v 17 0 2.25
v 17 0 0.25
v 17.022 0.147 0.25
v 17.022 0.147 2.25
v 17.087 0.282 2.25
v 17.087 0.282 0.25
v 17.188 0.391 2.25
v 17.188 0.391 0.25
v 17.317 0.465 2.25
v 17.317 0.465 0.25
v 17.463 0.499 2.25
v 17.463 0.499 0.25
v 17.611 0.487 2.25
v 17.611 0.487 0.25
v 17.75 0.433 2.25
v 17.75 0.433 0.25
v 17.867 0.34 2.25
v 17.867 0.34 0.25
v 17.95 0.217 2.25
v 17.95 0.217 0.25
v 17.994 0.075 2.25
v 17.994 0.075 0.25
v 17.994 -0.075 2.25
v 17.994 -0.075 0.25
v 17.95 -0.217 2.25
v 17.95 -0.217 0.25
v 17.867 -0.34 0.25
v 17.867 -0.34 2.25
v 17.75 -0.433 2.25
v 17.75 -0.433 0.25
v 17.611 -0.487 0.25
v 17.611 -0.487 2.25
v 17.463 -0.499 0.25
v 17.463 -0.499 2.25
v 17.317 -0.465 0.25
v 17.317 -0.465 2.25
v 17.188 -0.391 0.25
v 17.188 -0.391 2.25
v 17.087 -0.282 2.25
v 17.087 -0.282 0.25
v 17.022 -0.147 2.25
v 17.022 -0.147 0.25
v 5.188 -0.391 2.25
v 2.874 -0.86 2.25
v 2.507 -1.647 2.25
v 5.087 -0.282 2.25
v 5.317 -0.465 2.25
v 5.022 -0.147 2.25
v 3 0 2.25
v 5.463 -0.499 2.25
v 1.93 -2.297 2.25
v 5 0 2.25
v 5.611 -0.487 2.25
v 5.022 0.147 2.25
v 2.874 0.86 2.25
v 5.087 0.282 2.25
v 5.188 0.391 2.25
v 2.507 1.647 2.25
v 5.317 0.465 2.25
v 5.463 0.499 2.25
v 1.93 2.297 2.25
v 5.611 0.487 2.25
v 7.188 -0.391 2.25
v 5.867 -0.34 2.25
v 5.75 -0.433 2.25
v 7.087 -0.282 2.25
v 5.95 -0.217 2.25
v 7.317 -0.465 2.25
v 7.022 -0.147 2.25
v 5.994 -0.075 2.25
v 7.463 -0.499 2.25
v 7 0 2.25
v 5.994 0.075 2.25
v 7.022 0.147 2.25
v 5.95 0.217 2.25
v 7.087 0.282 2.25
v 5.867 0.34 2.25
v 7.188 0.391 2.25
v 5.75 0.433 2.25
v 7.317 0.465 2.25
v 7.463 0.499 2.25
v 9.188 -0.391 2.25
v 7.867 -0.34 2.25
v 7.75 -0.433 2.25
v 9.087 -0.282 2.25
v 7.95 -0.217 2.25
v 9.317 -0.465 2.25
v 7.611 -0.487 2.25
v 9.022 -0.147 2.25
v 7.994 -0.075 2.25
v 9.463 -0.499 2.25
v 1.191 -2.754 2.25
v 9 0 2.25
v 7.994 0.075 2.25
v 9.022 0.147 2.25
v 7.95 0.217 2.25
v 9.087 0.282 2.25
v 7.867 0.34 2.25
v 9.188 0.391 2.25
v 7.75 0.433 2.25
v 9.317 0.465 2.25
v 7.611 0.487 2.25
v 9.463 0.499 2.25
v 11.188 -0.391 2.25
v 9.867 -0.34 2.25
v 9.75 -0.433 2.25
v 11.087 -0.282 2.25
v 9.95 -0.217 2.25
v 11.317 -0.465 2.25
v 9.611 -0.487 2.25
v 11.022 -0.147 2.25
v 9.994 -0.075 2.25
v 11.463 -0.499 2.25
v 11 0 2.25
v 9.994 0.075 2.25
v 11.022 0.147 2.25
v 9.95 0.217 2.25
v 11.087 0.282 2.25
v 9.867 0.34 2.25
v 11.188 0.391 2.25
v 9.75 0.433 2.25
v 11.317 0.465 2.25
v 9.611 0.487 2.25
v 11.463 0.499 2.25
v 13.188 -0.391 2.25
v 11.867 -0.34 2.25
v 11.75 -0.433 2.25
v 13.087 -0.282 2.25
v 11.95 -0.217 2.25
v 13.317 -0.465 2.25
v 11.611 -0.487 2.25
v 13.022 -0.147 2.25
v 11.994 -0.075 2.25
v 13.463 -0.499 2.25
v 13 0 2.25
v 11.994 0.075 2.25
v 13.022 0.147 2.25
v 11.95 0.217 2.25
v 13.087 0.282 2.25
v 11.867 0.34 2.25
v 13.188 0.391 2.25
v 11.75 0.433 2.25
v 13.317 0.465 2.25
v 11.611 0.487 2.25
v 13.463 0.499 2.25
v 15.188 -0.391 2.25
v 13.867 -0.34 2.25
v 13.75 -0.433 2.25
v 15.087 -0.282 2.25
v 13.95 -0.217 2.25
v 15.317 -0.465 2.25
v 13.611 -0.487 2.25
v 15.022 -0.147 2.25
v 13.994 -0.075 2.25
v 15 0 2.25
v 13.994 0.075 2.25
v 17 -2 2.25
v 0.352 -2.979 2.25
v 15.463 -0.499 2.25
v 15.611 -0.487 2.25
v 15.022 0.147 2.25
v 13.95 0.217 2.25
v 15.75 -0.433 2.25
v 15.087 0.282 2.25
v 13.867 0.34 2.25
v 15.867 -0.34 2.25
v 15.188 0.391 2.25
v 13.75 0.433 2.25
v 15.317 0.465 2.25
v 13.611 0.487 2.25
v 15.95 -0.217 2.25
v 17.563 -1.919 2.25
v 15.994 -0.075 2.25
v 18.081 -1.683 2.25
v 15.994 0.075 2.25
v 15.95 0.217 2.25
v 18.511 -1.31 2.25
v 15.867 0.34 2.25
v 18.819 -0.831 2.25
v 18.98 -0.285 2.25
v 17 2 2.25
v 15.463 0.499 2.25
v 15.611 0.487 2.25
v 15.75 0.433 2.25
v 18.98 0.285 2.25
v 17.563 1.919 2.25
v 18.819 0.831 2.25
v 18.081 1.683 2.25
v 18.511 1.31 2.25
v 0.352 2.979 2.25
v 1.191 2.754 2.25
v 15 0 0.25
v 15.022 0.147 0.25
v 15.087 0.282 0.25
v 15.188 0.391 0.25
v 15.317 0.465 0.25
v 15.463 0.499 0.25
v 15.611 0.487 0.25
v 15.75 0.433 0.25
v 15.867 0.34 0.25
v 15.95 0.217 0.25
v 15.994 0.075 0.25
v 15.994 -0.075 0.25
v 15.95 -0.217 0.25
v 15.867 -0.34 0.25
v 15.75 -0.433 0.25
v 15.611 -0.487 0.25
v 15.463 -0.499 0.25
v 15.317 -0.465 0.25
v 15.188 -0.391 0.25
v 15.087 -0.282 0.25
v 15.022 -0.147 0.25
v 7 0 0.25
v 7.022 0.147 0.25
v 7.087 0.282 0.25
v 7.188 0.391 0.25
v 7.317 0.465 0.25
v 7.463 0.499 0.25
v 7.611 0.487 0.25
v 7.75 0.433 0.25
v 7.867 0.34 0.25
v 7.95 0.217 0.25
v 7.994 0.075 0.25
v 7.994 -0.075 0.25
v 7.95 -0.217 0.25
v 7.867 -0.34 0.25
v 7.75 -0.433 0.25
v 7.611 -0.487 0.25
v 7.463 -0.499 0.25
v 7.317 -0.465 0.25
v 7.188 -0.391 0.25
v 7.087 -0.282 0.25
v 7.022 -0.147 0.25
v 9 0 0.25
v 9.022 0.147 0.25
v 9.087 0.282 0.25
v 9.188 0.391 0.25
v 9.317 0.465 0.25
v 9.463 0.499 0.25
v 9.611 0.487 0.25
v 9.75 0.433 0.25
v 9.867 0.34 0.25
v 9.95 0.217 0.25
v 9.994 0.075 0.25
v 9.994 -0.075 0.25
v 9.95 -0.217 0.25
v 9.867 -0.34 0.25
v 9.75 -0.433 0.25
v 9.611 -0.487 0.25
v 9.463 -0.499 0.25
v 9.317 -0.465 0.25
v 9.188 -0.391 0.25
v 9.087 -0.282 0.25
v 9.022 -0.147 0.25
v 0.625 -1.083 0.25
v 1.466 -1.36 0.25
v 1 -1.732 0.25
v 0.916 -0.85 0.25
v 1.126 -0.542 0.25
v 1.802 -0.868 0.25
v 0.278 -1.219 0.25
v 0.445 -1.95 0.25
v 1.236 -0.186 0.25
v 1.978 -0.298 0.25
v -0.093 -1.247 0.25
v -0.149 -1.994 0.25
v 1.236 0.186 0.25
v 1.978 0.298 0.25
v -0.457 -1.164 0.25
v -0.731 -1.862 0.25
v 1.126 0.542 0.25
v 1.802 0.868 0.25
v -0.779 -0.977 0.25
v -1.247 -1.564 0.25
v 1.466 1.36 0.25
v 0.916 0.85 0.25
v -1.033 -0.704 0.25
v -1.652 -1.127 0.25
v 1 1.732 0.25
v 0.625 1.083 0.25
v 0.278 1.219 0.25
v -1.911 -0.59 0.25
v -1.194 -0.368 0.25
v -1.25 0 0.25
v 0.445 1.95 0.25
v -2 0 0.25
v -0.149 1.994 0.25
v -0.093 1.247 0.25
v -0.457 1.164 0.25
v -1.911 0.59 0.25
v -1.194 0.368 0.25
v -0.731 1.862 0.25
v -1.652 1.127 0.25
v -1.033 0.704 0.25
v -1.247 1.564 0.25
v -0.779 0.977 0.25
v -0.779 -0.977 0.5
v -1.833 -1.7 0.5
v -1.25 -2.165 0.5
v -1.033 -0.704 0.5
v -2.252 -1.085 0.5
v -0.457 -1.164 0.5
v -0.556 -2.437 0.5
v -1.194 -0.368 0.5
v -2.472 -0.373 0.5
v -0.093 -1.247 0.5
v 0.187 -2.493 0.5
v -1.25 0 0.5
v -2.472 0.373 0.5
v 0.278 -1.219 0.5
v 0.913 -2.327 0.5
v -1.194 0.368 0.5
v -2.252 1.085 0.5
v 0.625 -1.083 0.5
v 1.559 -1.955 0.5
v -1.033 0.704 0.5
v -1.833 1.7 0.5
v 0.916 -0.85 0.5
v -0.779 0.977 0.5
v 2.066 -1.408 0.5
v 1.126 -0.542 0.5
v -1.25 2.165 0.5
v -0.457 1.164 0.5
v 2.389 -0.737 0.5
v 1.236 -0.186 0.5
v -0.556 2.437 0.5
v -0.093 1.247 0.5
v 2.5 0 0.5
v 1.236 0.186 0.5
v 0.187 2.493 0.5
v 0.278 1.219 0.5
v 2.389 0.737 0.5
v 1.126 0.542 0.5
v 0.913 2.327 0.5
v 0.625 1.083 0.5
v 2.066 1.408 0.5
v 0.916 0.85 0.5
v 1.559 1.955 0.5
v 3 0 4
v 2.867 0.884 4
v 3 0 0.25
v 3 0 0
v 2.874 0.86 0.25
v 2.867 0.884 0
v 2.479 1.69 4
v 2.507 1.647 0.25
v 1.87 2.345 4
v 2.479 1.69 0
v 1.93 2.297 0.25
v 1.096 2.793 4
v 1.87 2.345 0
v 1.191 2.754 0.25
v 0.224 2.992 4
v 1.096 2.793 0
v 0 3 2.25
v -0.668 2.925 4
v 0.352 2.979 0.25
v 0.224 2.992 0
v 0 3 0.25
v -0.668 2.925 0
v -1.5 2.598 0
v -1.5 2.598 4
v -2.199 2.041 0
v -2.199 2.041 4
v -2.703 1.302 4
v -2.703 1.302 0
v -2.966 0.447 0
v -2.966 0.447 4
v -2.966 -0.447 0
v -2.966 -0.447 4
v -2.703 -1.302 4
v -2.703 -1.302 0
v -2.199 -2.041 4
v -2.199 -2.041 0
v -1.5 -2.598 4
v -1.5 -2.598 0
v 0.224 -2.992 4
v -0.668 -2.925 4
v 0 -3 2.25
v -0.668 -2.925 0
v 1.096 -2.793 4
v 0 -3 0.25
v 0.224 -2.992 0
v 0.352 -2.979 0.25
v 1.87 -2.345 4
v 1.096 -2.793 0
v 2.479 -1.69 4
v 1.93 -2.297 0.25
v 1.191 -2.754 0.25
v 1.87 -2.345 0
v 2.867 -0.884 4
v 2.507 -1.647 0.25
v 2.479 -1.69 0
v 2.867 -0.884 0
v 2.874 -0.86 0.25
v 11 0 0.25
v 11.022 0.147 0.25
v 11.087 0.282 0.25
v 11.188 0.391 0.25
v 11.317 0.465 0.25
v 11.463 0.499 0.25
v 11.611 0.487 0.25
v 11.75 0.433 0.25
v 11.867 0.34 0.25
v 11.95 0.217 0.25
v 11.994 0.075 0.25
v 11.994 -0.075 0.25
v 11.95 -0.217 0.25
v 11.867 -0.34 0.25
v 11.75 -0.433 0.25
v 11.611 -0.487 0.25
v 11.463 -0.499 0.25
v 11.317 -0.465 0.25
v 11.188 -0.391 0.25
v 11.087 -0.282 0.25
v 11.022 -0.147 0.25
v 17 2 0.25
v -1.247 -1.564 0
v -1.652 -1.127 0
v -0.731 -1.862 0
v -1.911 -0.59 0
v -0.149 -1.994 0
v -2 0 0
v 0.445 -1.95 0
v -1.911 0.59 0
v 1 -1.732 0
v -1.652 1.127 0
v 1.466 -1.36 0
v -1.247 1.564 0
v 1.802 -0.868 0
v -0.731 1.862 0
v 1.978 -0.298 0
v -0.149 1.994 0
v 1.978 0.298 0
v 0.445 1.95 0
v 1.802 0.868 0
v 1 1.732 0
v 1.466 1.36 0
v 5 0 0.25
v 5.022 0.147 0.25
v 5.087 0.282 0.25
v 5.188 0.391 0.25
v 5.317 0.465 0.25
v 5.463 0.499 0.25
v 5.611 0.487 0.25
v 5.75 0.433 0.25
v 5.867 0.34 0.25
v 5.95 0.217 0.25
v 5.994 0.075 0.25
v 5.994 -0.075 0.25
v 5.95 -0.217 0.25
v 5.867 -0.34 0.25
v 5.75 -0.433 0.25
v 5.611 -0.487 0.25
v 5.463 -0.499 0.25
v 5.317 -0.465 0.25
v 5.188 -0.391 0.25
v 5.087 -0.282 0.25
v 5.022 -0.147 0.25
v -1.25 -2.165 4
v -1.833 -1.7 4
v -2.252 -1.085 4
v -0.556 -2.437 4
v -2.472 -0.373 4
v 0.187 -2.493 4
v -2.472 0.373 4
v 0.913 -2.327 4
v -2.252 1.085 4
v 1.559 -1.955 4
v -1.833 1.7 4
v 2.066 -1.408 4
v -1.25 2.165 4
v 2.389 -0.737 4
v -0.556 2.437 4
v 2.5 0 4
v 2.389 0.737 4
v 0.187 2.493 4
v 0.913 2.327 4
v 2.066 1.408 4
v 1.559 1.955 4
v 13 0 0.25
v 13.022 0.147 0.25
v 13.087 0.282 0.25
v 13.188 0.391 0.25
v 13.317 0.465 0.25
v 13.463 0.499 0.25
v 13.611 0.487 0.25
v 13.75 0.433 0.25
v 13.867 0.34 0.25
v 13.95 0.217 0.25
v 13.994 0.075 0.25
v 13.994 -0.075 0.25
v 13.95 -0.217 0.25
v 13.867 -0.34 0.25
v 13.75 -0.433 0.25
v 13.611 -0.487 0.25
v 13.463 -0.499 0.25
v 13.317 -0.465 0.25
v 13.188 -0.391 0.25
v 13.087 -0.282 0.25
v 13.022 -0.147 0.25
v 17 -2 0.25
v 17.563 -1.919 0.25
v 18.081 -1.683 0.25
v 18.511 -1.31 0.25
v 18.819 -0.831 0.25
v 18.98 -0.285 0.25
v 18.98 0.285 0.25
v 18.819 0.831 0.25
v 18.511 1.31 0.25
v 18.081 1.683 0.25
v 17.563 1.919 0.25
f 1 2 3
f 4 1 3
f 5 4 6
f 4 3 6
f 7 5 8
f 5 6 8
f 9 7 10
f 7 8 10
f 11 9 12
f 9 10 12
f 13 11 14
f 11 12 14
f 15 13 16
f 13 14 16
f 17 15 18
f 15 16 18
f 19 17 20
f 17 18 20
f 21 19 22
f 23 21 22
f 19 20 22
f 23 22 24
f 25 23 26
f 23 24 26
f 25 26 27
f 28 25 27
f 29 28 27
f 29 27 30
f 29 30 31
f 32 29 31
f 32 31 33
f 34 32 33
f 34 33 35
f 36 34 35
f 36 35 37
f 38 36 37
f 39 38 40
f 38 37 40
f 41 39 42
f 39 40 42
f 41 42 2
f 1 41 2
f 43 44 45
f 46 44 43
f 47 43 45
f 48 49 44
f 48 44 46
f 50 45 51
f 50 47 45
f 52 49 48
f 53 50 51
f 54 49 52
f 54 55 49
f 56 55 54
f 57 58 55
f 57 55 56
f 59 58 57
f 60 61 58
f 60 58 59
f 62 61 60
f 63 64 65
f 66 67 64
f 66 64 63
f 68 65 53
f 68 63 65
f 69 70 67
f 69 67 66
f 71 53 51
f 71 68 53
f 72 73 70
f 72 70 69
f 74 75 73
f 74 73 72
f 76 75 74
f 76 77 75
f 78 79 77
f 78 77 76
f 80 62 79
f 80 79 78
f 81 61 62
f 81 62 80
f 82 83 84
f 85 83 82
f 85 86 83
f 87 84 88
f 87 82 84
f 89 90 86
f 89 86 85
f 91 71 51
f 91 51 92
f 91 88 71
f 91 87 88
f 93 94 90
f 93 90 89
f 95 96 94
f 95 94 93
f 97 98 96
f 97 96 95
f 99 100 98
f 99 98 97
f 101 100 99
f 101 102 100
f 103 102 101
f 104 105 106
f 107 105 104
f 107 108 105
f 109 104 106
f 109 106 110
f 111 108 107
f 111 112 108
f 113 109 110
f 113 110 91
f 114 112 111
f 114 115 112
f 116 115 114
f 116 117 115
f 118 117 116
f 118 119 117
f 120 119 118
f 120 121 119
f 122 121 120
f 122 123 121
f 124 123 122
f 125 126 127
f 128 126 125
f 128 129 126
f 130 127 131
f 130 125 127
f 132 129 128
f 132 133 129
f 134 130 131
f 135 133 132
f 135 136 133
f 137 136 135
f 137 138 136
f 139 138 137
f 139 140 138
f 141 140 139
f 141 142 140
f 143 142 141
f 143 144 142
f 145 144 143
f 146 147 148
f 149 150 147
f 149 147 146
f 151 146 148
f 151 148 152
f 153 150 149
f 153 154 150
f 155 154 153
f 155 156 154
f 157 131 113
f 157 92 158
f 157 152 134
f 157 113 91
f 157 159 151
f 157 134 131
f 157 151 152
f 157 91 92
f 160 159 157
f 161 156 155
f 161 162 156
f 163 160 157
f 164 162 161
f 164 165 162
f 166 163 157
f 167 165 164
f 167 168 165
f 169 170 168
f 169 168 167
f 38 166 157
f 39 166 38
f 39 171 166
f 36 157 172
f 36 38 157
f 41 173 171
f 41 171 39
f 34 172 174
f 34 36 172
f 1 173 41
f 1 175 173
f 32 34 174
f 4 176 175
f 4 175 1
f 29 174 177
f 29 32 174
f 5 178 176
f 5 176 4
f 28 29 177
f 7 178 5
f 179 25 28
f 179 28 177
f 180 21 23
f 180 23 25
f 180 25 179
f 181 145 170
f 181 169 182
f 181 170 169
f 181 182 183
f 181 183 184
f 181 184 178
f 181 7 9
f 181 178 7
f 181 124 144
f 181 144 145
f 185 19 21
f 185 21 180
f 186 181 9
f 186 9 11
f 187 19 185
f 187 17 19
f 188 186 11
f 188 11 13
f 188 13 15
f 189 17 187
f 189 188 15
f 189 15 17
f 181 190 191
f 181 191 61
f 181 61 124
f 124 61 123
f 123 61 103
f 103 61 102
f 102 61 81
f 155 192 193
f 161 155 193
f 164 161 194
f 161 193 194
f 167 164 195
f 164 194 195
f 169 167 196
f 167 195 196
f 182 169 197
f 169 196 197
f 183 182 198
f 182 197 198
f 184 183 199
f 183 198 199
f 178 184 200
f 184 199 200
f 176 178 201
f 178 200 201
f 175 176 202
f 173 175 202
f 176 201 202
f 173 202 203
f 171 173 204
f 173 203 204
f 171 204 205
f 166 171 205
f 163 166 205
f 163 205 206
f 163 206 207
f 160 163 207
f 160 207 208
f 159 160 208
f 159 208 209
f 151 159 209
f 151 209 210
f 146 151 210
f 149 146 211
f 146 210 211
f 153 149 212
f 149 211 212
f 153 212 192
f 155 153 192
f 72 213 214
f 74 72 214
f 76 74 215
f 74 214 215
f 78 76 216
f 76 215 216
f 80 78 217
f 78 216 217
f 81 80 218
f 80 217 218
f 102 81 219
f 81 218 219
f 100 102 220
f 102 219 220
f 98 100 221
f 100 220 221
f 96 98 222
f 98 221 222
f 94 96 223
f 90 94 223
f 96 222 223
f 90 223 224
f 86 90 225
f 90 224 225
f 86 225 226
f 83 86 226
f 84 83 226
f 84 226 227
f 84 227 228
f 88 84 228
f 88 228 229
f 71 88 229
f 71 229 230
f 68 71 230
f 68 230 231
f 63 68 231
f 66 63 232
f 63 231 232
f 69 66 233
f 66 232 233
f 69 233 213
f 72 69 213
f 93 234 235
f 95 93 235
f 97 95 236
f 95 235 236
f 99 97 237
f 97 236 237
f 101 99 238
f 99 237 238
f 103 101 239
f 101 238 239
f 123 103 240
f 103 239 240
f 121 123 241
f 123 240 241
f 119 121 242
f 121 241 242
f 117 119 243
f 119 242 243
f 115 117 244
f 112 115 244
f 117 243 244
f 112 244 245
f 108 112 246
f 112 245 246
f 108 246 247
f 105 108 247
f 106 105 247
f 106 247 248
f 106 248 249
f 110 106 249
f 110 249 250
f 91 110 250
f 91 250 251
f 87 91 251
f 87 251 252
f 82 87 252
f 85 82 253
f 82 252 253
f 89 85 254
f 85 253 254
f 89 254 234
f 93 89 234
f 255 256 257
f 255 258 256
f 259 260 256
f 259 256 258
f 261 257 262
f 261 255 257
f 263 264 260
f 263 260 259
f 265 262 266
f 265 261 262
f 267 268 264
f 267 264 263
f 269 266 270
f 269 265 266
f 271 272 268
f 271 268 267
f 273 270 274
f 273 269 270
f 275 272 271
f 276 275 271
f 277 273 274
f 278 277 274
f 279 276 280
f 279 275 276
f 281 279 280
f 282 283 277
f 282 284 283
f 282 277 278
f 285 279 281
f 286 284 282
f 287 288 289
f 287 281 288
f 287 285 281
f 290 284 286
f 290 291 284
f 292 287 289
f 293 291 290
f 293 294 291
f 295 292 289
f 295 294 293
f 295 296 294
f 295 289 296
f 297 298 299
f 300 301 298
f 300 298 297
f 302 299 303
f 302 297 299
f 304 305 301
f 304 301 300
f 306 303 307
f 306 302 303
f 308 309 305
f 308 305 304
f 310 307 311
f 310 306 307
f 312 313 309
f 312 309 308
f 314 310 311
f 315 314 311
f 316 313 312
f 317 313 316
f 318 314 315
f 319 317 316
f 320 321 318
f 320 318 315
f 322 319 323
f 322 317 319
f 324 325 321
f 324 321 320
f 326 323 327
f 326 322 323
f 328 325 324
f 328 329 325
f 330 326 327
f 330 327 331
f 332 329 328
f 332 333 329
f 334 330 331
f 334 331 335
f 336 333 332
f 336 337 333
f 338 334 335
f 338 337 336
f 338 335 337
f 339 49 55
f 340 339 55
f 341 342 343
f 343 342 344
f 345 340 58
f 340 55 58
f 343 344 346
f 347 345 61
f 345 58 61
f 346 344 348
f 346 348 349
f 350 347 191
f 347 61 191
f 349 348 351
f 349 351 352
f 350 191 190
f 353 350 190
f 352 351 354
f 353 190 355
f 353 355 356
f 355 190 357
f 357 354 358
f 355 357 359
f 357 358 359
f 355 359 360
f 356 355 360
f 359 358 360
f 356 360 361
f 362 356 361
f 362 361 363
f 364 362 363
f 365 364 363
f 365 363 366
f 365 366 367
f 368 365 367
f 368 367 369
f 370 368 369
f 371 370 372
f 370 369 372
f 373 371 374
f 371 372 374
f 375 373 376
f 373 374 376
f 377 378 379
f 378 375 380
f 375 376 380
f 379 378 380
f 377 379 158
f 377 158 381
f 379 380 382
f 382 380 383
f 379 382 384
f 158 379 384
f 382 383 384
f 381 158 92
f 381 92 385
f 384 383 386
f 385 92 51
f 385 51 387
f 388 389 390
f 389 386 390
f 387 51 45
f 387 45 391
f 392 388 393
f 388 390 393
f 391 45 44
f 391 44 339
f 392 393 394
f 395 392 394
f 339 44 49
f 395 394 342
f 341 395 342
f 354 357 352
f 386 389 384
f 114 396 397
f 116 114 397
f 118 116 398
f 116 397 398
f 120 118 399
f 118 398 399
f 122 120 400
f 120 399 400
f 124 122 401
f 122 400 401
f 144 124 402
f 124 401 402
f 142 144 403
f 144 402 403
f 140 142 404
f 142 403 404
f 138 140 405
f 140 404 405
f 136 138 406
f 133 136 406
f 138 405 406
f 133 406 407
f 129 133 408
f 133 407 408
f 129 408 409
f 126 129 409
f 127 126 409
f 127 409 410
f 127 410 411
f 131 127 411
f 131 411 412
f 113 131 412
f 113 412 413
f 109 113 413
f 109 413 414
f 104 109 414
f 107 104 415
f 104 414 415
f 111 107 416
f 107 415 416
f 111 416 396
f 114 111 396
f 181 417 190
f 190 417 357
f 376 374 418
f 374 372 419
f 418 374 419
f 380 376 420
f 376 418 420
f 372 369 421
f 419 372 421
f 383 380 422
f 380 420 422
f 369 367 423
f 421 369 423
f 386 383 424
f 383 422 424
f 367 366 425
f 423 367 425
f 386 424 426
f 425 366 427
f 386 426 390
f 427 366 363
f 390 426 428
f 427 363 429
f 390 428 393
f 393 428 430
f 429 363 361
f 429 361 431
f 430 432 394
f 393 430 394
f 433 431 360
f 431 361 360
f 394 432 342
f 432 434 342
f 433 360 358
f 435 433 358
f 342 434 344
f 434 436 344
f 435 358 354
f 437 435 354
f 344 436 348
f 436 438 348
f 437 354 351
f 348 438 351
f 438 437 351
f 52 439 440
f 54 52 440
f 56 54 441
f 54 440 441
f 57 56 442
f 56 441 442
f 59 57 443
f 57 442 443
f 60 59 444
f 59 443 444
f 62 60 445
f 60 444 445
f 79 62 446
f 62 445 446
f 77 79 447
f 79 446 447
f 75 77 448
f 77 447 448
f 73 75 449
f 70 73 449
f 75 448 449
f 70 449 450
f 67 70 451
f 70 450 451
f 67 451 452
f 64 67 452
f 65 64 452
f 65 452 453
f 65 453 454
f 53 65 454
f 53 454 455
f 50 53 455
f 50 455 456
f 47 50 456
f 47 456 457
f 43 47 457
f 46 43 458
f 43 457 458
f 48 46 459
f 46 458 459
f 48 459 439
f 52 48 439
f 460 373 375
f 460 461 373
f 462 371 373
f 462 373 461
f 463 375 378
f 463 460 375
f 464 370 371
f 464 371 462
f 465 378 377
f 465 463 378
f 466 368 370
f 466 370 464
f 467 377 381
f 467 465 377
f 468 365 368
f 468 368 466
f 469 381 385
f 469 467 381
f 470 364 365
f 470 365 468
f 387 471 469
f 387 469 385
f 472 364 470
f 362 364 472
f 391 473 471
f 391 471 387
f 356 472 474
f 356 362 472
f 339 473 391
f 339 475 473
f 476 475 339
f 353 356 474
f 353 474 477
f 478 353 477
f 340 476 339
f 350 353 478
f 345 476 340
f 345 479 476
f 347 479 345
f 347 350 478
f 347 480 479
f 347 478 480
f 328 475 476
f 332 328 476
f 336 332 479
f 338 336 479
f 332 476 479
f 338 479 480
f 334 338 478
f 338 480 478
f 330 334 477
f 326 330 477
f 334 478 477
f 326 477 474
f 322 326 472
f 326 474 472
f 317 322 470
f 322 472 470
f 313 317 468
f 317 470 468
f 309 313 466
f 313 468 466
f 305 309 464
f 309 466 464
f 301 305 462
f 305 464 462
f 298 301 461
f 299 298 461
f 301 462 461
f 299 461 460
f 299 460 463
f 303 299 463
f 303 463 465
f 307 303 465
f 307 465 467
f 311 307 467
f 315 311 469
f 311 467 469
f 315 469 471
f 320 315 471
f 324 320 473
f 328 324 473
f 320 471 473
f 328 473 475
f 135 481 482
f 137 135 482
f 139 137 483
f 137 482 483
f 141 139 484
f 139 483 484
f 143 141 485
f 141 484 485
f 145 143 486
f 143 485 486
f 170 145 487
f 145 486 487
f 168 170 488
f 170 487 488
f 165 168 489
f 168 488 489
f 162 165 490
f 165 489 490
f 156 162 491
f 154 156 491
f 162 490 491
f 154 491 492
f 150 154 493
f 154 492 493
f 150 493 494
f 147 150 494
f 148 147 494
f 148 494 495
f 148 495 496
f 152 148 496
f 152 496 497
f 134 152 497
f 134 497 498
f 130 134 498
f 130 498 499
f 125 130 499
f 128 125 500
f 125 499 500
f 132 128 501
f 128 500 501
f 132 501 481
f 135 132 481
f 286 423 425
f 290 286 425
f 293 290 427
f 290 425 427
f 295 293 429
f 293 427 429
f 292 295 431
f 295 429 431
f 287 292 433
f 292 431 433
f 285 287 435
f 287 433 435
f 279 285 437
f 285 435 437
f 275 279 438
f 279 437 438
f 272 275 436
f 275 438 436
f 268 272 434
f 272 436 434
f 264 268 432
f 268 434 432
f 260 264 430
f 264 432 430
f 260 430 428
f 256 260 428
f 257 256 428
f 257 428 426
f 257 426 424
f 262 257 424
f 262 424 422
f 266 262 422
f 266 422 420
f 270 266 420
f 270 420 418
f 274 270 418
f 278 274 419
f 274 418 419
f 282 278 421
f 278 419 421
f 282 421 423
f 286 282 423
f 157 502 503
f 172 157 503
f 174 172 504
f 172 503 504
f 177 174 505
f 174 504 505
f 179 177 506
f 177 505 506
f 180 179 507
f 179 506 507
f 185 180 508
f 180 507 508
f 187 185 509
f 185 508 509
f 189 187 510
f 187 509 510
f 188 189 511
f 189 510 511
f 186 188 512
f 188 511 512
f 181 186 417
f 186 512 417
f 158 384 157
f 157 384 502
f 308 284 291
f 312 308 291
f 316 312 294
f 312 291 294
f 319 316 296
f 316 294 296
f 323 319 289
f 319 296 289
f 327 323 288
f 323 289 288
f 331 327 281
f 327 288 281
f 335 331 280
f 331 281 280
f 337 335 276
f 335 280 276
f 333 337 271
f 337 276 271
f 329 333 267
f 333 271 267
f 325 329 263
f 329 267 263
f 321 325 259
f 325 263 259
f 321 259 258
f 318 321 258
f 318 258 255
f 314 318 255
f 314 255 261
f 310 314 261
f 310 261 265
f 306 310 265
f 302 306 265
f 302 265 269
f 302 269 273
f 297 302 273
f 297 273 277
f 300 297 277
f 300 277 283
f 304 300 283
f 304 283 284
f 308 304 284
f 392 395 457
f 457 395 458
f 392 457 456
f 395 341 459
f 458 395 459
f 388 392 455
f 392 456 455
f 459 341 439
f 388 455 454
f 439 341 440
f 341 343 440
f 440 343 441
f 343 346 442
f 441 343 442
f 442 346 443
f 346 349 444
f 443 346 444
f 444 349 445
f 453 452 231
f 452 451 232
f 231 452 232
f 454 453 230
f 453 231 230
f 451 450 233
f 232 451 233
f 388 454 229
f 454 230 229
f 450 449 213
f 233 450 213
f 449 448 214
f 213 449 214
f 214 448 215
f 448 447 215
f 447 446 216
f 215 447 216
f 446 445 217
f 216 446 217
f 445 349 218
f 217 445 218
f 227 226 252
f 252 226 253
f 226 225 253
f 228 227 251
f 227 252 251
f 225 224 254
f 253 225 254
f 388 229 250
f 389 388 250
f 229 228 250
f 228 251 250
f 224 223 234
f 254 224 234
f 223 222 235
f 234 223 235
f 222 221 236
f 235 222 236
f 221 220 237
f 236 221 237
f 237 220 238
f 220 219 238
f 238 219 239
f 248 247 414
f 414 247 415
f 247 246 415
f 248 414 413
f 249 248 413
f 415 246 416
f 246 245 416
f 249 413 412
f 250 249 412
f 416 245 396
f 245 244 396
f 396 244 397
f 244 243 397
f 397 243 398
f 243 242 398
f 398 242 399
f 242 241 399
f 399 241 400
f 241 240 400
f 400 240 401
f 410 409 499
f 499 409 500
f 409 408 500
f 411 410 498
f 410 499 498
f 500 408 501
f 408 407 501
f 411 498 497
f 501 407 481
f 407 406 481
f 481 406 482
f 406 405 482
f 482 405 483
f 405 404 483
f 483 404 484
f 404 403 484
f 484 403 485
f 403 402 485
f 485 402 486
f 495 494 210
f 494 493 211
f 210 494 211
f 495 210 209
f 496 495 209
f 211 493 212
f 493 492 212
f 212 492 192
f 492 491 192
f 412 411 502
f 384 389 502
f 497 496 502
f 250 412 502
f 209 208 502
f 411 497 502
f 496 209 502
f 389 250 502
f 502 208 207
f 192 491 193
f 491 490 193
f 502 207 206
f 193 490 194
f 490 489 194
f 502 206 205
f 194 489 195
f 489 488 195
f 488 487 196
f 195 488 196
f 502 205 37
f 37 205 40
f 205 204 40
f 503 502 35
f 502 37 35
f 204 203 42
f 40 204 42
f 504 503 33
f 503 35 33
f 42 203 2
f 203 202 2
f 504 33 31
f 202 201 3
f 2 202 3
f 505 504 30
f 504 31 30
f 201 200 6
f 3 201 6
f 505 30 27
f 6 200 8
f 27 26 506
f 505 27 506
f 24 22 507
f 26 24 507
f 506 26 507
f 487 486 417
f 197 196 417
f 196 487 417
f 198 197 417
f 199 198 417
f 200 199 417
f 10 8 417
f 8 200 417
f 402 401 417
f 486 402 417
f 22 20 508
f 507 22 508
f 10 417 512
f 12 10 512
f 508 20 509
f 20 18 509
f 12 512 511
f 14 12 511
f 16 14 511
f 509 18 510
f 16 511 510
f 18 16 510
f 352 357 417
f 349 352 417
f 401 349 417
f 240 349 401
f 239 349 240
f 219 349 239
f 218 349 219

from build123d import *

# Parameters (mm, degrees)
SKETCH_1_R          = 3
EXTRUDE_1_DEPTH     = 4
SKETCH_6_R          = 0.5
EXTRUDE_2_DEPTH     = 2
SKETCH_3_R          = 2
CUT_EXTRUDE_2_DEPTH = 0.25
SKETCH_4_R          = 1.25
CUT_EXTRUDE_3_DEPTH = 4.75
SKETCH_2_R          = 2.5
CUT_EXTRUDE_1_DEPTH = 3.5


with BuildPart() as part:
    # 草图1 → 凸台-拉伸1 (new body)
    with BuildSketch(Plane.XY):
        Circle(SKETCH_1_R)
    extrude(amount=EXTRUDE_1_DEPTH)

    # 草图6 → 凸台-拉伸2 (add)
    with BuildSketch(Plane(origin=(0, 0, 0.25), x_dir=(-1, 0, 0), z_dir=(0, 0, -1))):
        with BuildLine():
            Line((-17, 2), (0, 3))
            Line((0, 3), (0, -3))
            Line((0, -3), (-17, -2))
            ThreePointArc((-17, -2), (-19, 0), (-17, 2))
        make_face()
        with Locations((-17.5, 0)):
            Circle(SKETCH_6_R, mode=Mode.SUBTRACT)
        with Locations((-15.5, 0)):
            Circle(SKETCH_6_R, mode=Mode.SUBTRACT)
        with Locations((-13.5, 0)):
            Circle(SKETCH_6_R, mode=Mode.SUBTRACT)
        with Locations((-11.5, 0)):
            Circle(SKETCH_6_R, mode=Mode.SUBTRACT)
        with Locations((-9.5, 0)):
            Circle(SKETCH_6_R, mode=Mode.SUBTRACT)
        with Locations((-7.5, 0)):
            Circle(SKETCH_6_R, mode=Mode.SUBTRACT)
        with Locations((-5.5, 0)):
            Circle(SKETCH_6_R, mode=Mode.SUBTRACT)
    extrude(amount=-EXTRUDE_2_DEPTH)

    # 草图3 → 切除-拉伸2 (cut)
    with BuildSketch(Plane(origin=(0, 0, 0), x_dir=(-1, 0, 0), z_dir=(0, 0, -1))):
        Circle(SKETCH_3_R)
    extrude(amount=-CUT_EXTRUDE_2_DEPTH, mode=Mode.SUBTRACT)

    # 草图4 → 切除-拉伸3 (cut, through all)
    with BuildSketch(Plane(origin=(0, 0, 0.25), x_dir=(-1, 0, 0), z_dir=(0, 0, -1))):
        Circle(SKETCH_4_R)
    extrude(amount=-CUT_EXTRUDE_3_DEPTH, mode=Mode.SUBTRACT)

    # 草图2 → 切除-拉伸1 (cut)
    with BuildSketch(Plane.XY.offset(4)):
        Circle(SKETCH_2_R)
    extrude(amount=-CUT_EXTRUDE_1_DEPTH, mode=Mode.SUBTRACT)


solid = part.part
